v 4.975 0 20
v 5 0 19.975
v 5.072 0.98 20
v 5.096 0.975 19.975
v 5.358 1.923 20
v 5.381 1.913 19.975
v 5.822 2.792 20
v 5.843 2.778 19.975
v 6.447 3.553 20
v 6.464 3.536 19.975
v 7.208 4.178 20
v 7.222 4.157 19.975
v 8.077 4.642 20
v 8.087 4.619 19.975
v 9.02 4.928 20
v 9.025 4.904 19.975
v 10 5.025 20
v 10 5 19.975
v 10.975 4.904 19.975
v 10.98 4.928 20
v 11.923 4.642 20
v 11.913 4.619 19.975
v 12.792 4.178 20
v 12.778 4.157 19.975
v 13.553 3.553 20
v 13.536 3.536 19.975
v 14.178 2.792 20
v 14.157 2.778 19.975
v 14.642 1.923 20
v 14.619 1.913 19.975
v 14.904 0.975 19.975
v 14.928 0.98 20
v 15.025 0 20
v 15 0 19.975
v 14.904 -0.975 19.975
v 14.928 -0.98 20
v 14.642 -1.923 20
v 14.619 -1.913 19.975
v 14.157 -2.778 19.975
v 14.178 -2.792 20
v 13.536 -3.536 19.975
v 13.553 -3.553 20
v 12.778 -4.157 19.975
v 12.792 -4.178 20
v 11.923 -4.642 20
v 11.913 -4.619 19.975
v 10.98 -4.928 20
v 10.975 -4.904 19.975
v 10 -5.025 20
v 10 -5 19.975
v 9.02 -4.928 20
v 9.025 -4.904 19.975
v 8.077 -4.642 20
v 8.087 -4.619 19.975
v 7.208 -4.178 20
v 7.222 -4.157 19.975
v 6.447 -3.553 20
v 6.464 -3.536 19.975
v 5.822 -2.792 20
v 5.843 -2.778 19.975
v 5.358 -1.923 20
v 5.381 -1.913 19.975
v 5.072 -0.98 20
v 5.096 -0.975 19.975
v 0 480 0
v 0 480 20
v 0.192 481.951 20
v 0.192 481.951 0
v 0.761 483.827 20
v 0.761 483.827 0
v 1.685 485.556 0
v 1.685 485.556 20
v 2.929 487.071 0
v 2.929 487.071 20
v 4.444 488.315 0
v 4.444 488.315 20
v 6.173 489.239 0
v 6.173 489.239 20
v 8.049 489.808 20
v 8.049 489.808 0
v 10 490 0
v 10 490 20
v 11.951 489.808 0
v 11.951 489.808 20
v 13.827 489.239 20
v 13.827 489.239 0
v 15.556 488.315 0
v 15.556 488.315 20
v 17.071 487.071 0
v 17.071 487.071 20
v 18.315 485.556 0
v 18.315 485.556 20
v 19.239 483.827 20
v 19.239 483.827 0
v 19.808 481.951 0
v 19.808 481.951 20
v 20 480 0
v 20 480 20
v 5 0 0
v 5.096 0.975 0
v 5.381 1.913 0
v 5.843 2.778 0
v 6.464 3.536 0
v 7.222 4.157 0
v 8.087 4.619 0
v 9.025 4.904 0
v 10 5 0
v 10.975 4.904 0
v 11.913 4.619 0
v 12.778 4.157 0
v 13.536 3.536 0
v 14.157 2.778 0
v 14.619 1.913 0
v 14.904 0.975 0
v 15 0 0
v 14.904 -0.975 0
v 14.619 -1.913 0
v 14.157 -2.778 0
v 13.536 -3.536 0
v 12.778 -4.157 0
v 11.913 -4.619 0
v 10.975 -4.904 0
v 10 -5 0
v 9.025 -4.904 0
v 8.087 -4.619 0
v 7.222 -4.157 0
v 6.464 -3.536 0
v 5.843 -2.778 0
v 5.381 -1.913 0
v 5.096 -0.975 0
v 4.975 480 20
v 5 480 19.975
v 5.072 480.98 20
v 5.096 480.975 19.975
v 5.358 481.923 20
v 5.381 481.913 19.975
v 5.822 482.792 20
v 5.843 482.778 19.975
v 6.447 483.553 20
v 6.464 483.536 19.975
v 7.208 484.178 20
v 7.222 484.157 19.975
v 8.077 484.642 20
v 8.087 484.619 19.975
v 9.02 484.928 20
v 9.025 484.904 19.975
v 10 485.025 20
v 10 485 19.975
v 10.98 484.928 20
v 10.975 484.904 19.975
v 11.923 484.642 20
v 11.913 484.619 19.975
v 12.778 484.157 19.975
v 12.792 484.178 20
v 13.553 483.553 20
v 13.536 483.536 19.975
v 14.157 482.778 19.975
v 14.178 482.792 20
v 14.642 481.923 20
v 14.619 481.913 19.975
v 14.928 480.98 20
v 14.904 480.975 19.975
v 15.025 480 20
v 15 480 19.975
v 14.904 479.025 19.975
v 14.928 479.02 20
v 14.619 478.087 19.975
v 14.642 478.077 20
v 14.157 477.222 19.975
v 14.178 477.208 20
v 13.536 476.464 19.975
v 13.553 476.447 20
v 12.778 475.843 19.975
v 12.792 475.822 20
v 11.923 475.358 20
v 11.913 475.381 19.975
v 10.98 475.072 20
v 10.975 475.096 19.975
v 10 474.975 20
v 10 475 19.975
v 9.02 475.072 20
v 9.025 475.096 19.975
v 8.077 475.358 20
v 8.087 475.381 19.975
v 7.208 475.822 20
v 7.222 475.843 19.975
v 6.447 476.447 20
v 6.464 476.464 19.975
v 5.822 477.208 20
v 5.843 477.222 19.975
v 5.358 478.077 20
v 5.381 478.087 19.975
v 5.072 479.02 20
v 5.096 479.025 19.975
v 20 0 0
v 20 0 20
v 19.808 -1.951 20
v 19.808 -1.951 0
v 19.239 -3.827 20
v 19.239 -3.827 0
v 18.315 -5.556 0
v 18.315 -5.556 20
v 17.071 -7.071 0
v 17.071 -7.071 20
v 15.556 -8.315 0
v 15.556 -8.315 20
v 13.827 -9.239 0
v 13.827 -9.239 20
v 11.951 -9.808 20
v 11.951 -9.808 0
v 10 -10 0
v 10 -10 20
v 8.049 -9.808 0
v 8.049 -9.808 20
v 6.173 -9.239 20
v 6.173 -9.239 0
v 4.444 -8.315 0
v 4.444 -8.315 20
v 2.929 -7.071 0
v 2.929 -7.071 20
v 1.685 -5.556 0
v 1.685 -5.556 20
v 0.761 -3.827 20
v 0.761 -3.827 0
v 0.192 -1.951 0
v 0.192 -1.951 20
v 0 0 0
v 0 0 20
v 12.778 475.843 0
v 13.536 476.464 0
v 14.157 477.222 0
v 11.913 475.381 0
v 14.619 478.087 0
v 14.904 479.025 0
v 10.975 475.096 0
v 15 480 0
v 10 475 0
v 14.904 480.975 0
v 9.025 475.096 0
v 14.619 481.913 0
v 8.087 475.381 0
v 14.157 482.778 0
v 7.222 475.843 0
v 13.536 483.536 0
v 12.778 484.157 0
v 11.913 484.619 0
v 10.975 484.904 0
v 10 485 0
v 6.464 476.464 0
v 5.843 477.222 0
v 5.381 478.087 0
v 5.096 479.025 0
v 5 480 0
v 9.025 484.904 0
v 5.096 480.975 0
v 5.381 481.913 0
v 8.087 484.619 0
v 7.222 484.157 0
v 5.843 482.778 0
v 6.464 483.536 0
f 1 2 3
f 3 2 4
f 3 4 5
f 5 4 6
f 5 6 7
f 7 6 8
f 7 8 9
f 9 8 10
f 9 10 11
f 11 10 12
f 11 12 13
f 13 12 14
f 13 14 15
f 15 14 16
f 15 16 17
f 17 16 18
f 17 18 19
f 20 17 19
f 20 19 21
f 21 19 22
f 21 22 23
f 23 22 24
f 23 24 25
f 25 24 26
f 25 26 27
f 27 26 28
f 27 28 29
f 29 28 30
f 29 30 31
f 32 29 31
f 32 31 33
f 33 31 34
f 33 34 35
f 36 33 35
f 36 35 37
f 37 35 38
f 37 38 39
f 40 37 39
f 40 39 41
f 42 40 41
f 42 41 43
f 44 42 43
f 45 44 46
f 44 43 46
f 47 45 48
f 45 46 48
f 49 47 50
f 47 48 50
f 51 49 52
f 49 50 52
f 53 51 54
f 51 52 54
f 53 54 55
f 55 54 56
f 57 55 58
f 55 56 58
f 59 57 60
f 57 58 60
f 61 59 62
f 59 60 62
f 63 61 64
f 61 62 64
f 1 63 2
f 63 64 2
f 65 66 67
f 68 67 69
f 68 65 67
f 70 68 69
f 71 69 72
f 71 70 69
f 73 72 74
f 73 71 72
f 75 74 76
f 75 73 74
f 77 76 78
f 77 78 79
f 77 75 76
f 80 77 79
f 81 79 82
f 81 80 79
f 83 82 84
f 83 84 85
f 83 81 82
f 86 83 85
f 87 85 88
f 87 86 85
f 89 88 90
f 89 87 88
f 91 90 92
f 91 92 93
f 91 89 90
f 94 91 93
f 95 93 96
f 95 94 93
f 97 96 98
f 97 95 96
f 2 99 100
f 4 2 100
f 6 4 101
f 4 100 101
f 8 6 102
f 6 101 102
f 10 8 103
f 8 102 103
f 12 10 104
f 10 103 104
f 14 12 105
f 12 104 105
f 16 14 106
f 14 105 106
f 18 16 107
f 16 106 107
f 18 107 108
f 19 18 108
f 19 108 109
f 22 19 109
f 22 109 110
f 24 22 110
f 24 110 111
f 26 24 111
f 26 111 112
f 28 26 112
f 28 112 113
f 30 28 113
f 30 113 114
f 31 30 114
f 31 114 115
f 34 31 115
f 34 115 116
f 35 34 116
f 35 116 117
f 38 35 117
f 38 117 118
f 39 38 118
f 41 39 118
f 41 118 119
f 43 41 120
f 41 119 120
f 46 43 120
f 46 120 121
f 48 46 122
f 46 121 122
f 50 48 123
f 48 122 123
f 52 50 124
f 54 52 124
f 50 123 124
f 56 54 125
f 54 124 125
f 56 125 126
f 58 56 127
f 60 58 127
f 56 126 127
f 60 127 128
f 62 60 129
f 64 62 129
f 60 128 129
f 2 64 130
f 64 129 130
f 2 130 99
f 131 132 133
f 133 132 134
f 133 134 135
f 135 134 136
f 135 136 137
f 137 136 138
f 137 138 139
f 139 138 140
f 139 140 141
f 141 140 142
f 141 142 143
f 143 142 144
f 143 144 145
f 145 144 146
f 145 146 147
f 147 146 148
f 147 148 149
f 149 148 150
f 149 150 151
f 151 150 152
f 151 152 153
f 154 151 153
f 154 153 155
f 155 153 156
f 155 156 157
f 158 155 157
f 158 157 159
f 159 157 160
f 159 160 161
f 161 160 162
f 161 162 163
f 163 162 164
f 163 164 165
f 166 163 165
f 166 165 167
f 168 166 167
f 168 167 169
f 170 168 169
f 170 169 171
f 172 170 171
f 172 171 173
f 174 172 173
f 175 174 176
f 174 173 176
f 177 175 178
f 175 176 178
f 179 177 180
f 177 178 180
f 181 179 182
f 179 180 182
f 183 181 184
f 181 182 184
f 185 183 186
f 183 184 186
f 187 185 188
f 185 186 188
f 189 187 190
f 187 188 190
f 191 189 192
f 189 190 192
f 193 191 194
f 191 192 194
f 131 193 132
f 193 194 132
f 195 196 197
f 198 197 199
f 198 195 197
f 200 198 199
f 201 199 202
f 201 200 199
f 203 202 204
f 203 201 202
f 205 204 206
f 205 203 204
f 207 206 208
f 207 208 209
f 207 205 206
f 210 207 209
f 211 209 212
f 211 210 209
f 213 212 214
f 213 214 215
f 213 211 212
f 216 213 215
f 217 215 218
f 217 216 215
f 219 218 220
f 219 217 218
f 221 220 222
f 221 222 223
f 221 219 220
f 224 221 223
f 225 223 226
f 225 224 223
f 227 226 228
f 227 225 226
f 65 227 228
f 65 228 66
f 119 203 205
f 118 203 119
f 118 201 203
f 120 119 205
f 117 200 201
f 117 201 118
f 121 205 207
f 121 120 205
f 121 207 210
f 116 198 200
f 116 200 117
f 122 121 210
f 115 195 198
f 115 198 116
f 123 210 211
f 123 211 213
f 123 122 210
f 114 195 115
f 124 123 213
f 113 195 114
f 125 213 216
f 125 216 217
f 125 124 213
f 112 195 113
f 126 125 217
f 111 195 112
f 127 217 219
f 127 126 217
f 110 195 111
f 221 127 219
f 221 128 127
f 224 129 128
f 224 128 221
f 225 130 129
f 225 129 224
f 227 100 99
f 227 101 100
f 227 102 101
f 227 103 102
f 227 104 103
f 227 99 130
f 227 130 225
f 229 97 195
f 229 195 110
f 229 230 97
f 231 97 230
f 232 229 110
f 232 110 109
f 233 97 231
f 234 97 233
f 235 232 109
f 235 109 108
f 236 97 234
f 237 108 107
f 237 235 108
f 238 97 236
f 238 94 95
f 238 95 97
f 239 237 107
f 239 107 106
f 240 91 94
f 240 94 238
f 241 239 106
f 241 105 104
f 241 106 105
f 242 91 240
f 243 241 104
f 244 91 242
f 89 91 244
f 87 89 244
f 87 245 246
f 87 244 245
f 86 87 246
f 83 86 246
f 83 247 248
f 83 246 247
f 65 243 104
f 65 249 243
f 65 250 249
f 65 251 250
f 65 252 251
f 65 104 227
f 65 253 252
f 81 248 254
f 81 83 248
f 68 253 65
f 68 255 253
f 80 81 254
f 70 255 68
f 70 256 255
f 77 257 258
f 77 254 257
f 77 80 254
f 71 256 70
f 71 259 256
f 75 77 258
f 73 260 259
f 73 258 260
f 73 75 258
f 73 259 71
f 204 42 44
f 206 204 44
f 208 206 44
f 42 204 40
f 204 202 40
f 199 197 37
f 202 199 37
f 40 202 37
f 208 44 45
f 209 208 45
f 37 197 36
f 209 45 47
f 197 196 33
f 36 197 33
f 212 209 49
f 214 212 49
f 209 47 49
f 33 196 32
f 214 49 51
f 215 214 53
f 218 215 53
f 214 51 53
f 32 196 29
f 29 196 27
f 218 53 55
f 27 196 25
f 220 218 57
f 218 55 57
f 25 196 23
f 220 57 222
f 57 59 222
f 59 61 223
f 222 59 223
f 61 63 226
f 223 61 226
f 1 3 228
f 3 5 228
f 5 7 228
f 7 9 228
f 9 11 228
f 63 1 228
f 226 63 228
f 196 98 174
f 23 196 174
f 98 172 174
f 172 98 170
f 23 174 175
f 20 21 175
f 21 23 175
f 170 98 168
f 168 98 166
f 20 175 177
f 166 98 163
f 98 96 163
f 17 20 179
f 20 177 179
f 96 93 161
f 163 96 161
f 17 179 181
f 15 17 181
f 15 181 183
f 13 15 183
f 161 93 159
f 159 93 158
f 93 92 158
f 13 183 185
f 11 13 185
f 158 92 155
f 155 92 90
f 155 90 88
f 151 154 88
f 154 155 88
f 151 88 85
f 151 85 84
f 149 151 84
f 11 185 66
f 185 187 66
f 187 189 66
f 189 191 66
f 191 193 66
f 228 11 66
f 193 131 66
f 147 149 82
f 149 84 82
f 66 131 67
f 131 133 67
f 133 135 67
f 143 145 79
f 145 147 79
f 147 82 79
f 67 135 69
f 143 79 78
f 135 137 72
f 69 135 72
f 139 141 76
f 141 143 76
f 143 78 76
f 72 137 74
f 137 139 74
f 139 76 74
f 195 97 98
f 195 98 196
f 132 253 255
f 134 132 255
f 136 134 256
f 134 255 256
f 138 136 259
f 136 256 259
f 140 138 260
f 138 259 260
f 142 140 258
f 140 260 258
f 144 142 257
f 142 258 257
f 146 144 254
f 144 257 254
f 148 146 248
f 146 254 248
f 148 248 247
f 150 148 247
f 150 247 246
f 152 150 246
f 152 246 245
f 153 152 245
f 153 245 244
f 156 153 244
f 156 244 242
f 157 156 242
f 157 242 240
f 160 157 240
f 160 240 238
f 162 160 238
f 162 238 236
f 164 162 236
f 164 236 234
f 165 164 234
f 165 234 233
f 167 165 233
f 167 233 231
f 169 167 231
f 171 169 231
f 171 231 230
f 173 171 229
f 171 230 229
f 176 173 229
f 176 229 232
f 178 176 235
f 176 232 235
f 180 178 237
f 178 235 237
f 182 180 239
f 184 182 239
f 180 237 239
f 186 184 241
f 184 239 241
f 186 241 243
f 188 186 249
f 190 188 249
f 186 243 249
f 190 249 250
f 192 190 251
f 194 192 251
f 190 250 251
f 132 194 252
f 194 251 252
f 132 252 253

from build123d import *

# Parameters (mm, degrees)
BOSS_EXTRUDE1_DEPTH              = 20
F_10_0MM_DOWEL_HOLE1_D           = 10
F_10_0MM_DOWEL_HOLE1_DEPTH       = 20
F_10_0MM_DOWEL_HOLE1_CSINK_D     = 10.05
F_10_0MM_DOWEL_HOLE1_CSINK_ANGLE = 90


with BuildPart() as part:
    # Sketch1 → Boss-Extrude1 (new body)
    with BuildSketch(Plane.XY):
        with BuildLine():
            Line((0, 0), (0, 480))
            ThreePointArc((0, 480), (10, 490), (20, 480))
            Line((20, 480), (20, 0))
            ThreePointArc((20, 0), (10, -10), (0, 0))
        make_face()
    extrude(amount=BOSS_EXTRUDE1_DEPTH)

    # Ø10.0mm Dowel Hole1
    with Locations(Plane.XY.offset(20)):
        with Locations((10, 480), (10, 0)):
            CounterSinkHole(F_10_0MM_DOWEL_HOLE1_D / 2, F_10_0MM_DOWEL_HOLE1_CSINK_D / 2, depth=F_10_0MM_DOWEL_HOLE1_DEPTH, counter_sink_angle=F_10_0MM_DOWEL_HOLE1_CSINK_ANGLE)


solid = part.part
